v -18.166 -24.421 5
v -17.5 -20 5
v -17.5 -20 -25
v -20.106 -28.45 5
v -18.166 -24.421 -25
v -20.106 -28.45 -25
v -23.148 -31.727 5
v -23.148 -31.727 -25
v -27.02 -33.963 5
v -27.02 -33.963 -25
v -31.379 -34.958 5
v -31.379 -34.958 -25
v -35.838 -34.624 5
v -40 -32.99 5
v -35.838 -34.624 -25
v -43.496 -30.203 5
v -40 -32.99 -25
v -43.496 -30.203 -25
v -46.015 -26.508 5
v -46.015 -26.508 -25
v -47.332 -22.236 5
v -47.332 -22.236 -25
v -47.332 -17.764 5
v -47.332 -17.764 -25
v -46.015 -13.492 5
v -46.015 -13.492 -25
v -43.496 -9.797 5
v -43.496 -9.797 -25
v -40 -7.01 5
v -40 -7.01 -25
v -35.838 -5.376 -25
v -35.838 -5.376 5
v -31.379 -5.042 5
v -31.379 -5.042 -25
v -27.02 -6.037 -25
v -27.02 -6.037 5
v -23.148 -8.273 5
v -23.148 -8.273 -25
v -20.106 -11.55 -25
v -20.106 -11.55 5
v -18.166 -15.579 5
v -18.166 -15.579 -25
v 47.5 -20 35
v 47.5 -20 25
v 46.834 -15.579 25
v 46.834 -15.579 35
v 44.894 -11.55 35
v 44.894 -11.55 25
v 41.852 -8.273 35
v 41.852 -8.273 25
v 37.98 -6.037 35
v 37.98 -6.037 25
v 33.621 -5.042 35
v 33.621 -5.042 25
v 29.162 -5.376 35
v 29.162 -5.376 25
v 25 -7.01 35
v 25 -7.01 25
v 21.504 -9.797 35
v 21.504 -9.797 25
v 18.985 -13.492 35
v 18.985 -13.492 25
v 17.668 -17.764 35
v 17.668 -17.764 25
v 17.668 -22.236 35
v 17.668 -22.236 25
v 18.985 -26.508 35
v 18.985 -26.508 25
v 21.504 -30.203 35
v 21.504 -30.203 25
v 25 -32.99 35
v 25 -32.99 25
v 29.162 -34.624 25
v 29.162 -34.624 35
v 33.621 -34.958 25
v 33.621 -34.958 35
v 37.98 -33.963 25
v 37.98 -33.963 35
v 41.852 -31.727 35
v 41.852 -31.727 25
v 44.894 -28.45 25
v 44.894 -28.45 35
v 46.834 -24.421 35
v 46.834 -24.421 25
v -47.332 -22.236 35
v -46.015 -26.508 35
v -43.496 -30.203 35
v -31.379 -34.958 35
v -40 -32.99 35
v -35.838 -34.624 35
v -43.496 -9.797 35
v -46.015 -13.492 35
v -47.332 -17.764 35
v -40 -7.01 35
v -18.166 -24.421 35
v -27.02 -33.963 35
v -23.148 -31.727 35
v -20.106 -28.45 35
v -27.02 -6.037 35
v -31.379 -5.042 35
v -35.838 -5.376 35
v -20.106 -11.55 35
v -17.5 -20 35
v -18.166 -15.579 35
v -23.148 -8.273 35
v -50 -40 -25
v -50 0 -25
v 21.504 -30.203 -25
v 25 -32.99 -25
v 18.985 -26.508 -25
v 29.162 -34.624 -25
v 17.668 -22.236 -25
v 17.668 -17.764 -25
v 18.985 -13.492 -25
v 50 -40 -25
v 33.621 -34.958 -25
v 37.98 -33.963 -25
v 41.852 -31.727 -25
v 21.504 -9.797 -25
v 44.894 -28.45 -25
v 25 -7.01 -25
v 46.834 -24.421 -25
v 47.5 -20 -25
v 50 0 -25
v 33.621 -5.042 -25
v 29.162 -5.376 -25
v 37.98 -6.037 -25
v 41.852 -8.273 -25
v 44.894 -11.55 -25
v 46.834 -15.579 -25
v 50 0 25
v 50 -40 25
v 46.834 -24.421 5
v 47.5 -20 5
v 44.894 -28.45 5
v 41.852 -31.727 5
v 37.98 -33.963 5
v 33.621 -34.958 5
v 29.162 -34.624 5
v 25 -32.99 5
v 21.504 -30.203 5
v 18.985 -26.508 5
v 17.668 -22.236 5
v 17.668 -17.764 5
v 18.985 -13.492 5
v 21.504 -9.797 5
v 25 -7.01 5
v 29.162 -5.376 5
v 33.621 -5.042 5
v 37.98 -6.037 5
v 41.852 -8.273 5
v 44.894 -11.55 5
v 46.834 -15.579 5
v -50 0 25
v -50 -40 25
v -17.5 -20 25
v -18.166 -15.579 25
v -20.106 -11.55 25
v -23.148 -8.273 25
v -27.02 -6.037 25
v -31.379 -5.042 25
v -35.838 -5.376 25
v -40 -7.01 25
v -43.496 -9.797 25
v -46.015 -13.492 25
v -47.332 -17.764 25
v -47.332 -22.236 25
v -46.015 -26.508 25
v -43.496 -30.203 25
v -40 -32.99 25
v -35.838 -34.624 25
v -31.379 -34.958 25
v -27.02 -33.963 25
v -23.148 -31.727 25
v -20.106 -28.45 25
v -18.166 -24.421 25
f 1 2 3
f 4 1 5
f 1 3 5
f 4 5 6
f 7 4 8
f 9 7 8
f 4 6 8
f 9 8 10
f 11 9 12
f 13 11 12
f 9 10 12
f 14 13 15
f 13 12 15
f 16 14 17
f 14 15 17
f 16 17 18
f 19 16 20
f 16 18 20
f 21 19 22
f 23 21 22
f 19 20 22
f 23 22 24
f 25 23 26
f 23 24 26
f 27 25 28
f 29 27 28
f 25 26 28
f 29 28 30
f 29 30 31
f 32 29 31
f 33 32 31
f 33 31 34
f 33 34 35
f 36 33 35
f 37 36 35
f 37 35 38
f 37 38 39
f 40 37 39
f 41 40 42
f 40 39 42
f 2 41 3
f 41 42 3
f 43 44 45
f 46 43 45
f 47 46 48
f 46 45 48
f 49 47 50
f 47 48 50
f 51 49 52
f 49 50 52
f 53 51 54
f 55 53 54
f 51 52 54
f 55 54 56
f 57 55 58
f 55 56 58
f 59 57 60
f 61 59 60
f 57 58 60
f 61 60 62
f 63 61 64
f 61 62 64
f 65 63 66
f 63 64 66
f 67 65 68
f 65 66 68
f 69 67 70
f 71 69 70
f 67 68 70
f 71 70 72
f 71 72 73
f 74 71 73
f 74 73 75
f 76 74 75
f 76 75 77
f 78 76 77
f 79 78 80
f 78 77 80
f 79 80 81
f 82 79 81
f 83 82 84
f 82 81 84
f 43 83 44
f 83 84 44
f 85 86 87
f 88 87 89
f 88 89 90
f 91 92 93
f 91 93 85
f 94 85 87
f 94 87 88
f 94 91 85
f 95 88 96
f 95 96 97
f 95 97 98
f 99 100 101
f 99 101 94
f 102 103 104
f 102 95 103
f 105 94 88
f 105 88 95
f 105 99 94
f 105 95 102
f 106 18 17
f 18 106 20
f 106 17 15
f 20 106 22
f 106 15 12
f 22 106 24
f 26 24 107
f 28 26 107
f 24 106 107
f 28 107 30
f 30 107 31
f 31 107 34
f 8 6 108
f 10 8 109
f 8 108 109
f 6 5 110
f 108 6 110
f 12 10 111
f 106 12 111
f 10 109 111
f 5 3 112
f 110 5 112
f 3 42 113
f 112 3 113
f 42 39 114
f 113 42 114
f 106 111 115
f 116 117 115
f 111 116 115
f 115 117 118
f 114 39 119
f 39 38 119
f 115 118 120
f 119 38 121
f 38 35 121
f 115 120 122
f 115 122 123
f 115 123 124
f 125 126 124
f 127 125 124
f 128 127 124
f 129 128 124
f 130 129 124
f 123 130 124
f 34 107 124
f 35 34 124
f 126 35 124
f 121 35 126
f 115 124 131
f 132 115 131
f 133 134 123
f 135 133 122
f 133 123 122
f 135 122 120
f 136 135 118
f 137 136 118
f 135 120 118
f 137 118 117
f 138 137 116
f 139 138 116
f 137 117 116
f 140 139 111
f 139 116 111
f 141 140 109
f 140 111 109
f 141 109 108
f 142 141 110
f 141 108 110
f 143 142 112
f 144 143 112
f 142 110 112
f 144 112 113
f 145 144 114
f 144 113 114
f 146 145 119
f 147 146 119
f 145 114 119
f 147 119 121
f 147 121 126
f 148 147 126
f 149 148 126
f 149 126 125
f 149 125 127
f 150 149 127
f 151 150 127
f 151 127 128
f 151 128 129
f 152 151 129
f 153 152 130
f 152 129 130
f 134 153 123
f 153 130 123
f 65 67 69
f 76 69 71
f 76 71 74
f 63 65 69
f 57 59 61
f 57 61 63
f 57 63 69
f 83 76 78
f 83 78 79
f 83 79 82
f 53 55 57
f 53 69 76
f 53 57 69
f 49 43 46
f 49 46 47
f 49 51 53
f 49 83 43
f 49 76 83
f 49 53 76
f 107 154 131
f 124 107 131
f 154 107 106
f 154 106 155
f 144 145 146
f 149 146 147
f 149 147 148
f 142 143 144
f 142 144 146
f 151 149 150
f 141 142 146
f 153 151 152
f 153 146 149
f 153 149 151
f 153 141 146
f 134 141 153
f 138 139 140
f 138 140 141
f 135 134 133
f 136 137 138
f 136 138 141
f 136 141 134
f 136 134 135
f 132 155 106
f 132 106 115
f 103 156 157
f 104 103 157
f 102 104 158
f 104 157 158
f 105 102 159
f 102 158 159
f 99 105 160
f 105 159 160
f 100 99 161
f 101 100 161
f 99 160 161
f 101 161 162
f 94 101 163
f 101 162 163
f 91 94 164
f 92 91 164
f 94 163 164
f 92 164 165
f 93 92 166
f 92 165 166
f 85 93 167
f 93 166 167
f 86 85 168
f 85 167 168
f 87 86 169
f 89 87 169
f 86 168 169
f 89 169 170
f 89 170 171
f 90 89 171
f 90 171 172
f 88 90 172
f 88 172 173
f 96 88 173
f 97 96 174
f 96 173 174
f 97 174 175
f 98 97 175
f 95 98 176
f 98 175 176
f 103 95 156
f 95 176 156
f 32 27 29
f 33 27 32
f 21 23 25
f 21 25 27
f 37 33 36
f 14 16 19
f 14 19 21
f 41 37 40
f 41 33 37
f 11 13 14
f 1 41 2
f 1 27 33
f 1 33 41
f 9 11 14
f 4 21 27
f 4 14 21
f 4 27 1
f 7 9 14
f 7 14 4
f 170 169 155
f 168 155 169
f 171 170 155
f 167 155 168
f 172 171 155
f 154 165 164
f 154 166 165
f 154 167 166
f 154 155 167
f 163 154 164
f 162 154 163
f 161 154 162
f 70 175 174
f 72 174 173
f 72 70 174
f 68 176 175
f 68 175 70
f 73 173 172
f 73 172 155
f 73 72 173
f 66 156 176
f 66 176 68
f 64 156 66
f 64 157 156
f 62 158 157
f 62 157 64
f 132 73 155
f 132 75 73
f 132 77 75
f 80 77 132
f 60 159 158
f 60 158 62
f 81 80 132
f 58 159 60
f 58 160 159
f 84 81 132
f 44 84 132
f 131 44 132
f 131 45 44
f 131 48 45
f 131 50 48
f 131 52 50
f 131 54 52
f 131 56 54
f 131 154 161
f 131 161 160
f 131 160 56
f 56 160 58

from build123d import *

# Parameters (mm, degrees)
F0_W     = 100
F0_H     = 50
F1_DEPTH = 40
F2_R     = 15
F3_DEPTH = 10
F4_R     = 15
F5_DEPTH = 30


with BuildPart() as f1:
    # F0 (on Front) → F1 (new body)
    with BuildSketch(Plane.XZ):
        Rectangle(F0_W, F0_H)
    extrude(amount=F1_DEPTH)

    # F2 (on face) → F3 (join)
    with BuildSketch(Plane.XY.offset(25)):
        with Locations((-32.5, -20)):
            Circle(F2_R)
        with Locations((32.5, -20)):
            Circle(F2_R)
    extrude(amount=F3_DEPTH)

    # F4 (on face) → F5 (cut)
    with BuildSketch(Plane(origin=(0, 0, -25), x_dir=(1, 0, 0), z_dir=(0, 0, -1))):
        with Locations((-32.5, 20)):
            Circle(F4_R)
        with Locations((32.5, 20)):
            Circle(F4_R)
    extrude(amount=-F5_DEPTH, mode=Mode.SUBTRACT)


solid = f1.part
